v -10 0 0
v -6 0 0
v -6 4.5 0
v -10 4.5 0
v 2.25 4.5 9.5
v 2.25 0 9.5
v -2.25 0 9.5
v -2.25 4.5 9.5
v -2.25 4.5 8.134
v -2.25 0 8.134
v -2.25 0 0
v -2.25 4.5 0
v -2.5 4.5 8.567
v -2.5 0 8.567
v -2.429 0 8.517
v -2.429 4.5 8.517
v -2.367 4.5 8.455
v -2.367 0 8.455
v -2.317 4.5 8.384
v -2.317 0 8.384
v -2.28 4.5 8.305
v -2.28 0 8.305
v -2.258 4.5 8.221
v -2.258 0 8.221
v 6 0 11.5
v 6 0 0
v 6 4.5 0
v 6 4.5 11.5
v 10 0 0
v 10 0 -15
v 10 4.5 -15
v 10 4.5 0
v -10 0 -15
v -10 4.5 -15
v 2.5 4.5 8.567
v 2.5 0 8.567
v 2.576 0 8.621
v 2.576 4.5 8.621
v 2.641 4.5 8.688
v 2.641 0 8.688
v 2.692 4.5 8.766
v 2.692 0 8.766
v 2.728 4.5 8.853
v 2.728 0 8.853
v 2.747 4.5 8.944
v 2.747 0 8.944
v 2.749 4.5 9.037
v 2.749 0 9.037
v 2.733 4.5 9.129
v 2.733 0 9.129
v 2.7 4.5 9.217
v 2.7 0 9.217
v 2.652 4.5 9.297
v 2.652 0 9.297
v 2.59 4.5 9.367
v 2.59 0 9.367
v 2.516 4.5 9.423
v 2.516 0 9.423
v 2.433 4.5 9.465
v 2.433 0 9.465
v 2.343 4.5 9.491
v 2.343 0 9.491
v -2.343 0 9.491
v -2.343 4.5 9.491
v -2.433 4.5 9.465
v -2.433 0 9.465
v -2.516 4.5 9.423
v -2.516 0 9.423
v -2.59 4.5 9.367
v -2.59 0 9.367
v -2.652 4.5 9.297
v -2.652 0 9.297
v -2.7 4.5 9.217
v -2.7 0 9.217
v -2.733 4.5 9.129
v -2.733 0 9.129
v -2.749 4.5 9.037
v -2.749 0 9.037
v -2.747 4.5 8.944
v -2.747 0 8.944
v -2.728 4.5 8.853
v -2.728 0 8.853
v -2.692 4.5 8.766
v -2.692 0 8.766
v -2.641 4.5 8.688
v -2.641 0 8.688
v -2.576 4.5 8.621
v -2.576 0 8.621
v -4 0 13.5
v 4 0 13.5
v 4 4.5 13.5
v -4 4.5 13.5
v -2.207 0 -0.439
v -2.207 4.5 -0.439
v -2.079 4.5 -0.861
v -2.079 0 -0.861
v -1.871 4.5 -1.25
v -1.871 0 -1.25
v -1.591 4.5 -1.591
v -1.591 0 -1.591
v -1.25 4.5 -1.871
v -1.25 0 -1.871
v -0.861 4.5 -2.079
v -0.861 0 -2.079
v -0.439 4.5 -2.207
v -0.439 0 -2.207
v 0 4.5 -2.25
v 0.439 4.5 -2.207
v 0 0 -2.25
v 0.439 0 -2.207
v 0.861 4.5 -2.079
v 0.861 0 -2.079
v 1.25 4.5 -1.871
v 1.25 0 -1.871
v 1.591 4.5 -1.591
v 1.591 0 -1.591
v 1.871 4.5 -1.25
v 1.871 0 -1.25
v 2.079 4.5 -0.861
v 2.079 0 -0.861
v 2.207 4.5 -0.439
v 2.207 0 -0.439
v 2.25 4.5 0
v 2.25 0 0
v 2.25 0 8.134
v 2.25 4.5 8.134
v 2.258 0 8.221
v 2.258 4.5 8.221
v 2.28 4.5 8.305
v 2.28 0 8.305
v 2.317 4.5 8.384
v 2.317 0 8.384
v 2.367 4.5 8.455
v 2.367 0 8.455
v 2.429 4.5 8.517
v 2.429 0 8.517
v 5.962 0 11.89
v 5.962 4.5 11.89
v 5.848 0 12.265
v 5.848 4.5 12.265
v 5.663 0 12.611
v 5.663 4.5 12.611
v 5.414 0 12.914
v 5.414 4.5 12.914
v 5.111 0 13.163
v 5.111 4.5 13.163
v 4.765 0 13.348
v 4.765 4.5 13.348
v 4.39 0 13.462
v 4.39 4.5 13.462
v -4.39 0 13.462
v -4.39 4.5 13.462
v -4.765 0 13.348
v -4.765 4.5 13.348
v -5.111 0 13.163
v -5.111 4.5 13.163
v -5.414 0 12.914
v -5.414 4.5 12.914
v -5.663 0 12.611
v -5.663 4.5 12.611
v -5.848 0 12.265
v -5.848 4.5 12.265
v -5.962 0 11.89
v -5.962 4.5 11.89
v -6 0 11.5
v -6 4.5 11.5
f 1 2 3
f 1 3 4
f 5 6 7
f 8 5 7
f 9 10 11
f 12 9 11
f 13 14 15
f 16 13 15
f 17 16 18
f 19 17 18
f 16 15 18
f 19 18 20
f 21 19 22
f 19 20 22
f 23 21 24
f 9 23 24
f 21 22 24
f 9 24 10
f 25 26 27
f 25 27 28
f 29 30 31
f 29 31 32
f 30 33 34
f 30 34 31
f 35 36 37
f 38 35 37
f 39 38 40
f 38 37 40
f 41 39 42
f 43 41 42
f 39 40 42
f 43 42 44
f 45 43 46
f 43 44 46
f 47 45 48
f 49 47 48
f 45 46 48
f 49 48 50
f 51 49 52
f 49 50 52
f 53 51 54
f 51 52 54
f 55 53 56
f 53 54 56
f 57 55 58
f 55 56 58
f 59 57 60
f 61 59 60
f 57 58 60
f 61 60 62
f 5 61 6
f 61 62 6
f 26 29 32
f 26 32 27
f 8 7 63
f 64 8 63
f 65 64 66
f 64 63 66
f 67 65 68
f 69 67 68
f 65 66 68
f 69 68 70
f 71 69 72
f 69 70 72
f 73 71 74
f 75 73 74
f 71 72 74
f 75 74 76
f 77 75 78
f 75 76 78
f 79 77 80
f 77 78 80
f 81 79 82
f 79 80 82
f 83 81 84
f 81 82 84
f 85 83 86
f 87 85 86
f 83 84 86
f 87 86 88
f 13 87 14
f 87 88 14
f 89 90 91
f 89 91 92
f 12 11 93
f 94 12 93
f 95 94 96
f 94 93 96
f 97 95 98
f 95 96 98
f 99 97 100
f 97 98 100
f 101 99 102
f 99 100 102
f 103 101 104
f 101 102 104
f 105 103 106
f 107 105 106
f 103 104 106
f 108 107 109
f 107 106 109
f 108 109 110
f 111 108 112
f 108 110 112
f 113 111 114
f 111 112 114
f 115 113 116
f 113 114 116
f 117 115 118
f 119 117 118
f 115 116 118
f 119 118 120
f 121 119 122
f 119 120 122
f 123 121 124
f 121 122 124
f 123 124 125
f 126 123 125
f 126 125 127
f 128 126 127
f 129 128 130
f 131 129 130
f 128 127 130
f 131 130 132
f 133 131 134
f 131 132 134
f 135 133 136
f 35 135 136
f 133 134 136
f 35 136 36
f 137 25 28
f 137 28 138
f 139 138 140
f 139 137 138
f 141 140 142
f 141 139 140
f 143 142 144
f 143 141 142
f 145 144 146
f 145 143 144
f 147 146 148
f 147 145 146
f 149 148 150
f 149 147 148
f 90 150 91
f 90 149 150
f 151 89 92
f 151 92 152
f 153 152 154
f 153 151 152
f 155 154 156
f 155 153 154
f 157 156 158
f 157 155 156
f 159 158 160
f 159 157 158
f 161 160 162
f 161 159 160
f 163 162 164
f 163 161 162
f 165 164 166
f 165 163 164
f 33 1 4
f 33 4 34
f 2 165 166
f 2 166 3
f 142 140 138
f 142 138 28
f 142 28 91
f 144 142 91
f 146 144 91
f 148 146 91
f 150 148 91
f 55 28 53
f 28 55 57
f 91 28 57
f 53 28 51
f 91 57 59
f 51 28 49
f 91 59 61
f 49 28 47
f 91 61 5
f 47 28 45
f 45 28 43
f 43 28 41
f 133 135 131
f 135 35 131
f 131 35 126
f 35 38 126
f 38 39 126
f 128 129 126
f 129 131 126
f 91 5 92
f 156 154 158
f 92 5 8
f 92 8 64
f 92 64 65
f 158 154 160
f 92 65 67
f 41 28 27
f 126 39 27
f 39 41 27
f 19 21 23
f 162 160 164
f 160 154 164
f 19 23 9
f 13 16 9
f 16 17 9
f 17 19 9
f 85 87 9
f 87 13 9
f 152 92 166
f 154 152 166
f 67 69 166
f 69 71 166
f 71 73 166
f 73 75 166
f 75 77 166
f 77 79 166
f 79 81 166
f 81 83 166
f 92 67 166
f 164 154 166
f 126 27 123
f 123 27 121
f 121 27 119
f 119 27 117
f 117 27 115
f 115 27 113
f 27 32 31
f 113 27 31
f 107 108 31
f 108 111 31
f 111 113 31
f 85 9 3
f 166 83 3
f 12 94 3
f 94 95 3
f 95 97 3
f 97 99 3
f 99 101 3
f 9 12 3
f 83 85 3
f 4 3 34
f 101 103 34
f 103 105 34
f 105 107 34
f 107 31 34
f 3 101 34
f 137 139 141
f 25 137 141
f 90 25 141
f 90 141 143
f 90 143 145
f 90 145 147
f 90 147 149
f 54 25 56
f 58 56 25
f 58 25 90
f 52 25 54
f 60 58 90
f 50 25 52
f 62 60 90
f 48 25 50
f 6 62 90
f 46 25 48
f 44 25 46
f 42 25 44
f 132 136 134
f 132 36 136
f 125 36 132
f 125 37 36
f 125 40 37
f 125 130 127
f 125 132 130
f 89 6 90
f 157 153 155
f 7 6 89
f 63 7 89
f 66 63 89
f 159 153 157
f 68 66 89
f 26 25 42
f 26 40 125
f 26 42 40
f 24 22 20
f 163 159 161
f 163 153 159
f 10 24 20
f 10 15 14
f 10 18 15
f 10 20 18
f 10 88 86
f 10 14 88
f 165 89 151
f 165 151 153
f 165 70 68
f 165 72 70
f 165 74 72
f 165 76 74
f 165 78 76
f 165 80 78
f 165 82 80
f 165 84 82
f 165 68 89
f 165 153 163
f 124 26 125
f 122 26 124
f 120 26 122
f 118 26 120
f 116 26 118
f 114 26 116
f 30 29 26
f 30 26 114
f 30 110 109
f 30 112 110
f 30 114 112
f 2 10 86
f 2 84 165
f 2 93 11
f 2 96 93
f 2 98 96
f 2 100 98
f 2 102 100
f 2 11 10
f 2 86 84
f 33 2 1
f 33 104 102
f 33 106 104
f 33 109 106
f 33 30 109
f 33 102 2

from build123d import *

# Parameters (mm, degrees)
BOSS_EXTRUDE1_DEPTH = 4.5


with BuildPart() as part:
    # Sketch1 → Boss-Extrude1 (new body)
    with BuildSketch(Plane(origin=(0, 0, 0), x_dir=(1, 0, 0), z_dir=(0, 1, 0))):
        with BuildLine():
            Line((-10, 0), (-10, 15))
            Line((-10, 15), (10, 15))
            Line((10, 15), (10, 0))
            Line((10, 0), (6, 0))
            Line((6, 0), (6, -11.5))
            ThreePointArc((6, -11.5), (5.414213562, -12.914213562), (4, -13.5))
            Line((4, -13.5), (-4, -13.5))
            ThreePointArc((-4, -13.5), (-5.414213562, -12.914213562), (-6, -11.5))
            Line((-6, -11.5), (-6, 0))
            Line((-6, 0), (-10, 0))
        make_face()
        with BuildLine():
            Line((2.25, 0), (2.25, -8.133974596))
            ThreePointArc((2.25, -8.133974596), (2.316987298, -8.383974596), (2.5, -8.566987298))
            ThreePointArc((2.5, -8.566987298), (2.732962913, -9.129409523), (2.25, -9.5))
            Line((2.25, -9.5), (-2.25, -9.5))
            ThreePointArc((-2.25, -9.5), (-2.732962913, -9.129409523), (-2.5, -8.566987298))
            ThreePointArc((-2.5, -8.566987298), (-2.316987298, -8.383974596), (-2.25, -8.133974596))
            Line((-2.25, -8.133974596), (-2.25, 0))
            ThreePointArc((-2.25, 0), (0, 2.25), (2.25, 0))
        make_face(mode=Mode.SUBTRACT)
    extrude(amount=BOSS_EXTRUDE1_DEPTH)


solid = part.part
